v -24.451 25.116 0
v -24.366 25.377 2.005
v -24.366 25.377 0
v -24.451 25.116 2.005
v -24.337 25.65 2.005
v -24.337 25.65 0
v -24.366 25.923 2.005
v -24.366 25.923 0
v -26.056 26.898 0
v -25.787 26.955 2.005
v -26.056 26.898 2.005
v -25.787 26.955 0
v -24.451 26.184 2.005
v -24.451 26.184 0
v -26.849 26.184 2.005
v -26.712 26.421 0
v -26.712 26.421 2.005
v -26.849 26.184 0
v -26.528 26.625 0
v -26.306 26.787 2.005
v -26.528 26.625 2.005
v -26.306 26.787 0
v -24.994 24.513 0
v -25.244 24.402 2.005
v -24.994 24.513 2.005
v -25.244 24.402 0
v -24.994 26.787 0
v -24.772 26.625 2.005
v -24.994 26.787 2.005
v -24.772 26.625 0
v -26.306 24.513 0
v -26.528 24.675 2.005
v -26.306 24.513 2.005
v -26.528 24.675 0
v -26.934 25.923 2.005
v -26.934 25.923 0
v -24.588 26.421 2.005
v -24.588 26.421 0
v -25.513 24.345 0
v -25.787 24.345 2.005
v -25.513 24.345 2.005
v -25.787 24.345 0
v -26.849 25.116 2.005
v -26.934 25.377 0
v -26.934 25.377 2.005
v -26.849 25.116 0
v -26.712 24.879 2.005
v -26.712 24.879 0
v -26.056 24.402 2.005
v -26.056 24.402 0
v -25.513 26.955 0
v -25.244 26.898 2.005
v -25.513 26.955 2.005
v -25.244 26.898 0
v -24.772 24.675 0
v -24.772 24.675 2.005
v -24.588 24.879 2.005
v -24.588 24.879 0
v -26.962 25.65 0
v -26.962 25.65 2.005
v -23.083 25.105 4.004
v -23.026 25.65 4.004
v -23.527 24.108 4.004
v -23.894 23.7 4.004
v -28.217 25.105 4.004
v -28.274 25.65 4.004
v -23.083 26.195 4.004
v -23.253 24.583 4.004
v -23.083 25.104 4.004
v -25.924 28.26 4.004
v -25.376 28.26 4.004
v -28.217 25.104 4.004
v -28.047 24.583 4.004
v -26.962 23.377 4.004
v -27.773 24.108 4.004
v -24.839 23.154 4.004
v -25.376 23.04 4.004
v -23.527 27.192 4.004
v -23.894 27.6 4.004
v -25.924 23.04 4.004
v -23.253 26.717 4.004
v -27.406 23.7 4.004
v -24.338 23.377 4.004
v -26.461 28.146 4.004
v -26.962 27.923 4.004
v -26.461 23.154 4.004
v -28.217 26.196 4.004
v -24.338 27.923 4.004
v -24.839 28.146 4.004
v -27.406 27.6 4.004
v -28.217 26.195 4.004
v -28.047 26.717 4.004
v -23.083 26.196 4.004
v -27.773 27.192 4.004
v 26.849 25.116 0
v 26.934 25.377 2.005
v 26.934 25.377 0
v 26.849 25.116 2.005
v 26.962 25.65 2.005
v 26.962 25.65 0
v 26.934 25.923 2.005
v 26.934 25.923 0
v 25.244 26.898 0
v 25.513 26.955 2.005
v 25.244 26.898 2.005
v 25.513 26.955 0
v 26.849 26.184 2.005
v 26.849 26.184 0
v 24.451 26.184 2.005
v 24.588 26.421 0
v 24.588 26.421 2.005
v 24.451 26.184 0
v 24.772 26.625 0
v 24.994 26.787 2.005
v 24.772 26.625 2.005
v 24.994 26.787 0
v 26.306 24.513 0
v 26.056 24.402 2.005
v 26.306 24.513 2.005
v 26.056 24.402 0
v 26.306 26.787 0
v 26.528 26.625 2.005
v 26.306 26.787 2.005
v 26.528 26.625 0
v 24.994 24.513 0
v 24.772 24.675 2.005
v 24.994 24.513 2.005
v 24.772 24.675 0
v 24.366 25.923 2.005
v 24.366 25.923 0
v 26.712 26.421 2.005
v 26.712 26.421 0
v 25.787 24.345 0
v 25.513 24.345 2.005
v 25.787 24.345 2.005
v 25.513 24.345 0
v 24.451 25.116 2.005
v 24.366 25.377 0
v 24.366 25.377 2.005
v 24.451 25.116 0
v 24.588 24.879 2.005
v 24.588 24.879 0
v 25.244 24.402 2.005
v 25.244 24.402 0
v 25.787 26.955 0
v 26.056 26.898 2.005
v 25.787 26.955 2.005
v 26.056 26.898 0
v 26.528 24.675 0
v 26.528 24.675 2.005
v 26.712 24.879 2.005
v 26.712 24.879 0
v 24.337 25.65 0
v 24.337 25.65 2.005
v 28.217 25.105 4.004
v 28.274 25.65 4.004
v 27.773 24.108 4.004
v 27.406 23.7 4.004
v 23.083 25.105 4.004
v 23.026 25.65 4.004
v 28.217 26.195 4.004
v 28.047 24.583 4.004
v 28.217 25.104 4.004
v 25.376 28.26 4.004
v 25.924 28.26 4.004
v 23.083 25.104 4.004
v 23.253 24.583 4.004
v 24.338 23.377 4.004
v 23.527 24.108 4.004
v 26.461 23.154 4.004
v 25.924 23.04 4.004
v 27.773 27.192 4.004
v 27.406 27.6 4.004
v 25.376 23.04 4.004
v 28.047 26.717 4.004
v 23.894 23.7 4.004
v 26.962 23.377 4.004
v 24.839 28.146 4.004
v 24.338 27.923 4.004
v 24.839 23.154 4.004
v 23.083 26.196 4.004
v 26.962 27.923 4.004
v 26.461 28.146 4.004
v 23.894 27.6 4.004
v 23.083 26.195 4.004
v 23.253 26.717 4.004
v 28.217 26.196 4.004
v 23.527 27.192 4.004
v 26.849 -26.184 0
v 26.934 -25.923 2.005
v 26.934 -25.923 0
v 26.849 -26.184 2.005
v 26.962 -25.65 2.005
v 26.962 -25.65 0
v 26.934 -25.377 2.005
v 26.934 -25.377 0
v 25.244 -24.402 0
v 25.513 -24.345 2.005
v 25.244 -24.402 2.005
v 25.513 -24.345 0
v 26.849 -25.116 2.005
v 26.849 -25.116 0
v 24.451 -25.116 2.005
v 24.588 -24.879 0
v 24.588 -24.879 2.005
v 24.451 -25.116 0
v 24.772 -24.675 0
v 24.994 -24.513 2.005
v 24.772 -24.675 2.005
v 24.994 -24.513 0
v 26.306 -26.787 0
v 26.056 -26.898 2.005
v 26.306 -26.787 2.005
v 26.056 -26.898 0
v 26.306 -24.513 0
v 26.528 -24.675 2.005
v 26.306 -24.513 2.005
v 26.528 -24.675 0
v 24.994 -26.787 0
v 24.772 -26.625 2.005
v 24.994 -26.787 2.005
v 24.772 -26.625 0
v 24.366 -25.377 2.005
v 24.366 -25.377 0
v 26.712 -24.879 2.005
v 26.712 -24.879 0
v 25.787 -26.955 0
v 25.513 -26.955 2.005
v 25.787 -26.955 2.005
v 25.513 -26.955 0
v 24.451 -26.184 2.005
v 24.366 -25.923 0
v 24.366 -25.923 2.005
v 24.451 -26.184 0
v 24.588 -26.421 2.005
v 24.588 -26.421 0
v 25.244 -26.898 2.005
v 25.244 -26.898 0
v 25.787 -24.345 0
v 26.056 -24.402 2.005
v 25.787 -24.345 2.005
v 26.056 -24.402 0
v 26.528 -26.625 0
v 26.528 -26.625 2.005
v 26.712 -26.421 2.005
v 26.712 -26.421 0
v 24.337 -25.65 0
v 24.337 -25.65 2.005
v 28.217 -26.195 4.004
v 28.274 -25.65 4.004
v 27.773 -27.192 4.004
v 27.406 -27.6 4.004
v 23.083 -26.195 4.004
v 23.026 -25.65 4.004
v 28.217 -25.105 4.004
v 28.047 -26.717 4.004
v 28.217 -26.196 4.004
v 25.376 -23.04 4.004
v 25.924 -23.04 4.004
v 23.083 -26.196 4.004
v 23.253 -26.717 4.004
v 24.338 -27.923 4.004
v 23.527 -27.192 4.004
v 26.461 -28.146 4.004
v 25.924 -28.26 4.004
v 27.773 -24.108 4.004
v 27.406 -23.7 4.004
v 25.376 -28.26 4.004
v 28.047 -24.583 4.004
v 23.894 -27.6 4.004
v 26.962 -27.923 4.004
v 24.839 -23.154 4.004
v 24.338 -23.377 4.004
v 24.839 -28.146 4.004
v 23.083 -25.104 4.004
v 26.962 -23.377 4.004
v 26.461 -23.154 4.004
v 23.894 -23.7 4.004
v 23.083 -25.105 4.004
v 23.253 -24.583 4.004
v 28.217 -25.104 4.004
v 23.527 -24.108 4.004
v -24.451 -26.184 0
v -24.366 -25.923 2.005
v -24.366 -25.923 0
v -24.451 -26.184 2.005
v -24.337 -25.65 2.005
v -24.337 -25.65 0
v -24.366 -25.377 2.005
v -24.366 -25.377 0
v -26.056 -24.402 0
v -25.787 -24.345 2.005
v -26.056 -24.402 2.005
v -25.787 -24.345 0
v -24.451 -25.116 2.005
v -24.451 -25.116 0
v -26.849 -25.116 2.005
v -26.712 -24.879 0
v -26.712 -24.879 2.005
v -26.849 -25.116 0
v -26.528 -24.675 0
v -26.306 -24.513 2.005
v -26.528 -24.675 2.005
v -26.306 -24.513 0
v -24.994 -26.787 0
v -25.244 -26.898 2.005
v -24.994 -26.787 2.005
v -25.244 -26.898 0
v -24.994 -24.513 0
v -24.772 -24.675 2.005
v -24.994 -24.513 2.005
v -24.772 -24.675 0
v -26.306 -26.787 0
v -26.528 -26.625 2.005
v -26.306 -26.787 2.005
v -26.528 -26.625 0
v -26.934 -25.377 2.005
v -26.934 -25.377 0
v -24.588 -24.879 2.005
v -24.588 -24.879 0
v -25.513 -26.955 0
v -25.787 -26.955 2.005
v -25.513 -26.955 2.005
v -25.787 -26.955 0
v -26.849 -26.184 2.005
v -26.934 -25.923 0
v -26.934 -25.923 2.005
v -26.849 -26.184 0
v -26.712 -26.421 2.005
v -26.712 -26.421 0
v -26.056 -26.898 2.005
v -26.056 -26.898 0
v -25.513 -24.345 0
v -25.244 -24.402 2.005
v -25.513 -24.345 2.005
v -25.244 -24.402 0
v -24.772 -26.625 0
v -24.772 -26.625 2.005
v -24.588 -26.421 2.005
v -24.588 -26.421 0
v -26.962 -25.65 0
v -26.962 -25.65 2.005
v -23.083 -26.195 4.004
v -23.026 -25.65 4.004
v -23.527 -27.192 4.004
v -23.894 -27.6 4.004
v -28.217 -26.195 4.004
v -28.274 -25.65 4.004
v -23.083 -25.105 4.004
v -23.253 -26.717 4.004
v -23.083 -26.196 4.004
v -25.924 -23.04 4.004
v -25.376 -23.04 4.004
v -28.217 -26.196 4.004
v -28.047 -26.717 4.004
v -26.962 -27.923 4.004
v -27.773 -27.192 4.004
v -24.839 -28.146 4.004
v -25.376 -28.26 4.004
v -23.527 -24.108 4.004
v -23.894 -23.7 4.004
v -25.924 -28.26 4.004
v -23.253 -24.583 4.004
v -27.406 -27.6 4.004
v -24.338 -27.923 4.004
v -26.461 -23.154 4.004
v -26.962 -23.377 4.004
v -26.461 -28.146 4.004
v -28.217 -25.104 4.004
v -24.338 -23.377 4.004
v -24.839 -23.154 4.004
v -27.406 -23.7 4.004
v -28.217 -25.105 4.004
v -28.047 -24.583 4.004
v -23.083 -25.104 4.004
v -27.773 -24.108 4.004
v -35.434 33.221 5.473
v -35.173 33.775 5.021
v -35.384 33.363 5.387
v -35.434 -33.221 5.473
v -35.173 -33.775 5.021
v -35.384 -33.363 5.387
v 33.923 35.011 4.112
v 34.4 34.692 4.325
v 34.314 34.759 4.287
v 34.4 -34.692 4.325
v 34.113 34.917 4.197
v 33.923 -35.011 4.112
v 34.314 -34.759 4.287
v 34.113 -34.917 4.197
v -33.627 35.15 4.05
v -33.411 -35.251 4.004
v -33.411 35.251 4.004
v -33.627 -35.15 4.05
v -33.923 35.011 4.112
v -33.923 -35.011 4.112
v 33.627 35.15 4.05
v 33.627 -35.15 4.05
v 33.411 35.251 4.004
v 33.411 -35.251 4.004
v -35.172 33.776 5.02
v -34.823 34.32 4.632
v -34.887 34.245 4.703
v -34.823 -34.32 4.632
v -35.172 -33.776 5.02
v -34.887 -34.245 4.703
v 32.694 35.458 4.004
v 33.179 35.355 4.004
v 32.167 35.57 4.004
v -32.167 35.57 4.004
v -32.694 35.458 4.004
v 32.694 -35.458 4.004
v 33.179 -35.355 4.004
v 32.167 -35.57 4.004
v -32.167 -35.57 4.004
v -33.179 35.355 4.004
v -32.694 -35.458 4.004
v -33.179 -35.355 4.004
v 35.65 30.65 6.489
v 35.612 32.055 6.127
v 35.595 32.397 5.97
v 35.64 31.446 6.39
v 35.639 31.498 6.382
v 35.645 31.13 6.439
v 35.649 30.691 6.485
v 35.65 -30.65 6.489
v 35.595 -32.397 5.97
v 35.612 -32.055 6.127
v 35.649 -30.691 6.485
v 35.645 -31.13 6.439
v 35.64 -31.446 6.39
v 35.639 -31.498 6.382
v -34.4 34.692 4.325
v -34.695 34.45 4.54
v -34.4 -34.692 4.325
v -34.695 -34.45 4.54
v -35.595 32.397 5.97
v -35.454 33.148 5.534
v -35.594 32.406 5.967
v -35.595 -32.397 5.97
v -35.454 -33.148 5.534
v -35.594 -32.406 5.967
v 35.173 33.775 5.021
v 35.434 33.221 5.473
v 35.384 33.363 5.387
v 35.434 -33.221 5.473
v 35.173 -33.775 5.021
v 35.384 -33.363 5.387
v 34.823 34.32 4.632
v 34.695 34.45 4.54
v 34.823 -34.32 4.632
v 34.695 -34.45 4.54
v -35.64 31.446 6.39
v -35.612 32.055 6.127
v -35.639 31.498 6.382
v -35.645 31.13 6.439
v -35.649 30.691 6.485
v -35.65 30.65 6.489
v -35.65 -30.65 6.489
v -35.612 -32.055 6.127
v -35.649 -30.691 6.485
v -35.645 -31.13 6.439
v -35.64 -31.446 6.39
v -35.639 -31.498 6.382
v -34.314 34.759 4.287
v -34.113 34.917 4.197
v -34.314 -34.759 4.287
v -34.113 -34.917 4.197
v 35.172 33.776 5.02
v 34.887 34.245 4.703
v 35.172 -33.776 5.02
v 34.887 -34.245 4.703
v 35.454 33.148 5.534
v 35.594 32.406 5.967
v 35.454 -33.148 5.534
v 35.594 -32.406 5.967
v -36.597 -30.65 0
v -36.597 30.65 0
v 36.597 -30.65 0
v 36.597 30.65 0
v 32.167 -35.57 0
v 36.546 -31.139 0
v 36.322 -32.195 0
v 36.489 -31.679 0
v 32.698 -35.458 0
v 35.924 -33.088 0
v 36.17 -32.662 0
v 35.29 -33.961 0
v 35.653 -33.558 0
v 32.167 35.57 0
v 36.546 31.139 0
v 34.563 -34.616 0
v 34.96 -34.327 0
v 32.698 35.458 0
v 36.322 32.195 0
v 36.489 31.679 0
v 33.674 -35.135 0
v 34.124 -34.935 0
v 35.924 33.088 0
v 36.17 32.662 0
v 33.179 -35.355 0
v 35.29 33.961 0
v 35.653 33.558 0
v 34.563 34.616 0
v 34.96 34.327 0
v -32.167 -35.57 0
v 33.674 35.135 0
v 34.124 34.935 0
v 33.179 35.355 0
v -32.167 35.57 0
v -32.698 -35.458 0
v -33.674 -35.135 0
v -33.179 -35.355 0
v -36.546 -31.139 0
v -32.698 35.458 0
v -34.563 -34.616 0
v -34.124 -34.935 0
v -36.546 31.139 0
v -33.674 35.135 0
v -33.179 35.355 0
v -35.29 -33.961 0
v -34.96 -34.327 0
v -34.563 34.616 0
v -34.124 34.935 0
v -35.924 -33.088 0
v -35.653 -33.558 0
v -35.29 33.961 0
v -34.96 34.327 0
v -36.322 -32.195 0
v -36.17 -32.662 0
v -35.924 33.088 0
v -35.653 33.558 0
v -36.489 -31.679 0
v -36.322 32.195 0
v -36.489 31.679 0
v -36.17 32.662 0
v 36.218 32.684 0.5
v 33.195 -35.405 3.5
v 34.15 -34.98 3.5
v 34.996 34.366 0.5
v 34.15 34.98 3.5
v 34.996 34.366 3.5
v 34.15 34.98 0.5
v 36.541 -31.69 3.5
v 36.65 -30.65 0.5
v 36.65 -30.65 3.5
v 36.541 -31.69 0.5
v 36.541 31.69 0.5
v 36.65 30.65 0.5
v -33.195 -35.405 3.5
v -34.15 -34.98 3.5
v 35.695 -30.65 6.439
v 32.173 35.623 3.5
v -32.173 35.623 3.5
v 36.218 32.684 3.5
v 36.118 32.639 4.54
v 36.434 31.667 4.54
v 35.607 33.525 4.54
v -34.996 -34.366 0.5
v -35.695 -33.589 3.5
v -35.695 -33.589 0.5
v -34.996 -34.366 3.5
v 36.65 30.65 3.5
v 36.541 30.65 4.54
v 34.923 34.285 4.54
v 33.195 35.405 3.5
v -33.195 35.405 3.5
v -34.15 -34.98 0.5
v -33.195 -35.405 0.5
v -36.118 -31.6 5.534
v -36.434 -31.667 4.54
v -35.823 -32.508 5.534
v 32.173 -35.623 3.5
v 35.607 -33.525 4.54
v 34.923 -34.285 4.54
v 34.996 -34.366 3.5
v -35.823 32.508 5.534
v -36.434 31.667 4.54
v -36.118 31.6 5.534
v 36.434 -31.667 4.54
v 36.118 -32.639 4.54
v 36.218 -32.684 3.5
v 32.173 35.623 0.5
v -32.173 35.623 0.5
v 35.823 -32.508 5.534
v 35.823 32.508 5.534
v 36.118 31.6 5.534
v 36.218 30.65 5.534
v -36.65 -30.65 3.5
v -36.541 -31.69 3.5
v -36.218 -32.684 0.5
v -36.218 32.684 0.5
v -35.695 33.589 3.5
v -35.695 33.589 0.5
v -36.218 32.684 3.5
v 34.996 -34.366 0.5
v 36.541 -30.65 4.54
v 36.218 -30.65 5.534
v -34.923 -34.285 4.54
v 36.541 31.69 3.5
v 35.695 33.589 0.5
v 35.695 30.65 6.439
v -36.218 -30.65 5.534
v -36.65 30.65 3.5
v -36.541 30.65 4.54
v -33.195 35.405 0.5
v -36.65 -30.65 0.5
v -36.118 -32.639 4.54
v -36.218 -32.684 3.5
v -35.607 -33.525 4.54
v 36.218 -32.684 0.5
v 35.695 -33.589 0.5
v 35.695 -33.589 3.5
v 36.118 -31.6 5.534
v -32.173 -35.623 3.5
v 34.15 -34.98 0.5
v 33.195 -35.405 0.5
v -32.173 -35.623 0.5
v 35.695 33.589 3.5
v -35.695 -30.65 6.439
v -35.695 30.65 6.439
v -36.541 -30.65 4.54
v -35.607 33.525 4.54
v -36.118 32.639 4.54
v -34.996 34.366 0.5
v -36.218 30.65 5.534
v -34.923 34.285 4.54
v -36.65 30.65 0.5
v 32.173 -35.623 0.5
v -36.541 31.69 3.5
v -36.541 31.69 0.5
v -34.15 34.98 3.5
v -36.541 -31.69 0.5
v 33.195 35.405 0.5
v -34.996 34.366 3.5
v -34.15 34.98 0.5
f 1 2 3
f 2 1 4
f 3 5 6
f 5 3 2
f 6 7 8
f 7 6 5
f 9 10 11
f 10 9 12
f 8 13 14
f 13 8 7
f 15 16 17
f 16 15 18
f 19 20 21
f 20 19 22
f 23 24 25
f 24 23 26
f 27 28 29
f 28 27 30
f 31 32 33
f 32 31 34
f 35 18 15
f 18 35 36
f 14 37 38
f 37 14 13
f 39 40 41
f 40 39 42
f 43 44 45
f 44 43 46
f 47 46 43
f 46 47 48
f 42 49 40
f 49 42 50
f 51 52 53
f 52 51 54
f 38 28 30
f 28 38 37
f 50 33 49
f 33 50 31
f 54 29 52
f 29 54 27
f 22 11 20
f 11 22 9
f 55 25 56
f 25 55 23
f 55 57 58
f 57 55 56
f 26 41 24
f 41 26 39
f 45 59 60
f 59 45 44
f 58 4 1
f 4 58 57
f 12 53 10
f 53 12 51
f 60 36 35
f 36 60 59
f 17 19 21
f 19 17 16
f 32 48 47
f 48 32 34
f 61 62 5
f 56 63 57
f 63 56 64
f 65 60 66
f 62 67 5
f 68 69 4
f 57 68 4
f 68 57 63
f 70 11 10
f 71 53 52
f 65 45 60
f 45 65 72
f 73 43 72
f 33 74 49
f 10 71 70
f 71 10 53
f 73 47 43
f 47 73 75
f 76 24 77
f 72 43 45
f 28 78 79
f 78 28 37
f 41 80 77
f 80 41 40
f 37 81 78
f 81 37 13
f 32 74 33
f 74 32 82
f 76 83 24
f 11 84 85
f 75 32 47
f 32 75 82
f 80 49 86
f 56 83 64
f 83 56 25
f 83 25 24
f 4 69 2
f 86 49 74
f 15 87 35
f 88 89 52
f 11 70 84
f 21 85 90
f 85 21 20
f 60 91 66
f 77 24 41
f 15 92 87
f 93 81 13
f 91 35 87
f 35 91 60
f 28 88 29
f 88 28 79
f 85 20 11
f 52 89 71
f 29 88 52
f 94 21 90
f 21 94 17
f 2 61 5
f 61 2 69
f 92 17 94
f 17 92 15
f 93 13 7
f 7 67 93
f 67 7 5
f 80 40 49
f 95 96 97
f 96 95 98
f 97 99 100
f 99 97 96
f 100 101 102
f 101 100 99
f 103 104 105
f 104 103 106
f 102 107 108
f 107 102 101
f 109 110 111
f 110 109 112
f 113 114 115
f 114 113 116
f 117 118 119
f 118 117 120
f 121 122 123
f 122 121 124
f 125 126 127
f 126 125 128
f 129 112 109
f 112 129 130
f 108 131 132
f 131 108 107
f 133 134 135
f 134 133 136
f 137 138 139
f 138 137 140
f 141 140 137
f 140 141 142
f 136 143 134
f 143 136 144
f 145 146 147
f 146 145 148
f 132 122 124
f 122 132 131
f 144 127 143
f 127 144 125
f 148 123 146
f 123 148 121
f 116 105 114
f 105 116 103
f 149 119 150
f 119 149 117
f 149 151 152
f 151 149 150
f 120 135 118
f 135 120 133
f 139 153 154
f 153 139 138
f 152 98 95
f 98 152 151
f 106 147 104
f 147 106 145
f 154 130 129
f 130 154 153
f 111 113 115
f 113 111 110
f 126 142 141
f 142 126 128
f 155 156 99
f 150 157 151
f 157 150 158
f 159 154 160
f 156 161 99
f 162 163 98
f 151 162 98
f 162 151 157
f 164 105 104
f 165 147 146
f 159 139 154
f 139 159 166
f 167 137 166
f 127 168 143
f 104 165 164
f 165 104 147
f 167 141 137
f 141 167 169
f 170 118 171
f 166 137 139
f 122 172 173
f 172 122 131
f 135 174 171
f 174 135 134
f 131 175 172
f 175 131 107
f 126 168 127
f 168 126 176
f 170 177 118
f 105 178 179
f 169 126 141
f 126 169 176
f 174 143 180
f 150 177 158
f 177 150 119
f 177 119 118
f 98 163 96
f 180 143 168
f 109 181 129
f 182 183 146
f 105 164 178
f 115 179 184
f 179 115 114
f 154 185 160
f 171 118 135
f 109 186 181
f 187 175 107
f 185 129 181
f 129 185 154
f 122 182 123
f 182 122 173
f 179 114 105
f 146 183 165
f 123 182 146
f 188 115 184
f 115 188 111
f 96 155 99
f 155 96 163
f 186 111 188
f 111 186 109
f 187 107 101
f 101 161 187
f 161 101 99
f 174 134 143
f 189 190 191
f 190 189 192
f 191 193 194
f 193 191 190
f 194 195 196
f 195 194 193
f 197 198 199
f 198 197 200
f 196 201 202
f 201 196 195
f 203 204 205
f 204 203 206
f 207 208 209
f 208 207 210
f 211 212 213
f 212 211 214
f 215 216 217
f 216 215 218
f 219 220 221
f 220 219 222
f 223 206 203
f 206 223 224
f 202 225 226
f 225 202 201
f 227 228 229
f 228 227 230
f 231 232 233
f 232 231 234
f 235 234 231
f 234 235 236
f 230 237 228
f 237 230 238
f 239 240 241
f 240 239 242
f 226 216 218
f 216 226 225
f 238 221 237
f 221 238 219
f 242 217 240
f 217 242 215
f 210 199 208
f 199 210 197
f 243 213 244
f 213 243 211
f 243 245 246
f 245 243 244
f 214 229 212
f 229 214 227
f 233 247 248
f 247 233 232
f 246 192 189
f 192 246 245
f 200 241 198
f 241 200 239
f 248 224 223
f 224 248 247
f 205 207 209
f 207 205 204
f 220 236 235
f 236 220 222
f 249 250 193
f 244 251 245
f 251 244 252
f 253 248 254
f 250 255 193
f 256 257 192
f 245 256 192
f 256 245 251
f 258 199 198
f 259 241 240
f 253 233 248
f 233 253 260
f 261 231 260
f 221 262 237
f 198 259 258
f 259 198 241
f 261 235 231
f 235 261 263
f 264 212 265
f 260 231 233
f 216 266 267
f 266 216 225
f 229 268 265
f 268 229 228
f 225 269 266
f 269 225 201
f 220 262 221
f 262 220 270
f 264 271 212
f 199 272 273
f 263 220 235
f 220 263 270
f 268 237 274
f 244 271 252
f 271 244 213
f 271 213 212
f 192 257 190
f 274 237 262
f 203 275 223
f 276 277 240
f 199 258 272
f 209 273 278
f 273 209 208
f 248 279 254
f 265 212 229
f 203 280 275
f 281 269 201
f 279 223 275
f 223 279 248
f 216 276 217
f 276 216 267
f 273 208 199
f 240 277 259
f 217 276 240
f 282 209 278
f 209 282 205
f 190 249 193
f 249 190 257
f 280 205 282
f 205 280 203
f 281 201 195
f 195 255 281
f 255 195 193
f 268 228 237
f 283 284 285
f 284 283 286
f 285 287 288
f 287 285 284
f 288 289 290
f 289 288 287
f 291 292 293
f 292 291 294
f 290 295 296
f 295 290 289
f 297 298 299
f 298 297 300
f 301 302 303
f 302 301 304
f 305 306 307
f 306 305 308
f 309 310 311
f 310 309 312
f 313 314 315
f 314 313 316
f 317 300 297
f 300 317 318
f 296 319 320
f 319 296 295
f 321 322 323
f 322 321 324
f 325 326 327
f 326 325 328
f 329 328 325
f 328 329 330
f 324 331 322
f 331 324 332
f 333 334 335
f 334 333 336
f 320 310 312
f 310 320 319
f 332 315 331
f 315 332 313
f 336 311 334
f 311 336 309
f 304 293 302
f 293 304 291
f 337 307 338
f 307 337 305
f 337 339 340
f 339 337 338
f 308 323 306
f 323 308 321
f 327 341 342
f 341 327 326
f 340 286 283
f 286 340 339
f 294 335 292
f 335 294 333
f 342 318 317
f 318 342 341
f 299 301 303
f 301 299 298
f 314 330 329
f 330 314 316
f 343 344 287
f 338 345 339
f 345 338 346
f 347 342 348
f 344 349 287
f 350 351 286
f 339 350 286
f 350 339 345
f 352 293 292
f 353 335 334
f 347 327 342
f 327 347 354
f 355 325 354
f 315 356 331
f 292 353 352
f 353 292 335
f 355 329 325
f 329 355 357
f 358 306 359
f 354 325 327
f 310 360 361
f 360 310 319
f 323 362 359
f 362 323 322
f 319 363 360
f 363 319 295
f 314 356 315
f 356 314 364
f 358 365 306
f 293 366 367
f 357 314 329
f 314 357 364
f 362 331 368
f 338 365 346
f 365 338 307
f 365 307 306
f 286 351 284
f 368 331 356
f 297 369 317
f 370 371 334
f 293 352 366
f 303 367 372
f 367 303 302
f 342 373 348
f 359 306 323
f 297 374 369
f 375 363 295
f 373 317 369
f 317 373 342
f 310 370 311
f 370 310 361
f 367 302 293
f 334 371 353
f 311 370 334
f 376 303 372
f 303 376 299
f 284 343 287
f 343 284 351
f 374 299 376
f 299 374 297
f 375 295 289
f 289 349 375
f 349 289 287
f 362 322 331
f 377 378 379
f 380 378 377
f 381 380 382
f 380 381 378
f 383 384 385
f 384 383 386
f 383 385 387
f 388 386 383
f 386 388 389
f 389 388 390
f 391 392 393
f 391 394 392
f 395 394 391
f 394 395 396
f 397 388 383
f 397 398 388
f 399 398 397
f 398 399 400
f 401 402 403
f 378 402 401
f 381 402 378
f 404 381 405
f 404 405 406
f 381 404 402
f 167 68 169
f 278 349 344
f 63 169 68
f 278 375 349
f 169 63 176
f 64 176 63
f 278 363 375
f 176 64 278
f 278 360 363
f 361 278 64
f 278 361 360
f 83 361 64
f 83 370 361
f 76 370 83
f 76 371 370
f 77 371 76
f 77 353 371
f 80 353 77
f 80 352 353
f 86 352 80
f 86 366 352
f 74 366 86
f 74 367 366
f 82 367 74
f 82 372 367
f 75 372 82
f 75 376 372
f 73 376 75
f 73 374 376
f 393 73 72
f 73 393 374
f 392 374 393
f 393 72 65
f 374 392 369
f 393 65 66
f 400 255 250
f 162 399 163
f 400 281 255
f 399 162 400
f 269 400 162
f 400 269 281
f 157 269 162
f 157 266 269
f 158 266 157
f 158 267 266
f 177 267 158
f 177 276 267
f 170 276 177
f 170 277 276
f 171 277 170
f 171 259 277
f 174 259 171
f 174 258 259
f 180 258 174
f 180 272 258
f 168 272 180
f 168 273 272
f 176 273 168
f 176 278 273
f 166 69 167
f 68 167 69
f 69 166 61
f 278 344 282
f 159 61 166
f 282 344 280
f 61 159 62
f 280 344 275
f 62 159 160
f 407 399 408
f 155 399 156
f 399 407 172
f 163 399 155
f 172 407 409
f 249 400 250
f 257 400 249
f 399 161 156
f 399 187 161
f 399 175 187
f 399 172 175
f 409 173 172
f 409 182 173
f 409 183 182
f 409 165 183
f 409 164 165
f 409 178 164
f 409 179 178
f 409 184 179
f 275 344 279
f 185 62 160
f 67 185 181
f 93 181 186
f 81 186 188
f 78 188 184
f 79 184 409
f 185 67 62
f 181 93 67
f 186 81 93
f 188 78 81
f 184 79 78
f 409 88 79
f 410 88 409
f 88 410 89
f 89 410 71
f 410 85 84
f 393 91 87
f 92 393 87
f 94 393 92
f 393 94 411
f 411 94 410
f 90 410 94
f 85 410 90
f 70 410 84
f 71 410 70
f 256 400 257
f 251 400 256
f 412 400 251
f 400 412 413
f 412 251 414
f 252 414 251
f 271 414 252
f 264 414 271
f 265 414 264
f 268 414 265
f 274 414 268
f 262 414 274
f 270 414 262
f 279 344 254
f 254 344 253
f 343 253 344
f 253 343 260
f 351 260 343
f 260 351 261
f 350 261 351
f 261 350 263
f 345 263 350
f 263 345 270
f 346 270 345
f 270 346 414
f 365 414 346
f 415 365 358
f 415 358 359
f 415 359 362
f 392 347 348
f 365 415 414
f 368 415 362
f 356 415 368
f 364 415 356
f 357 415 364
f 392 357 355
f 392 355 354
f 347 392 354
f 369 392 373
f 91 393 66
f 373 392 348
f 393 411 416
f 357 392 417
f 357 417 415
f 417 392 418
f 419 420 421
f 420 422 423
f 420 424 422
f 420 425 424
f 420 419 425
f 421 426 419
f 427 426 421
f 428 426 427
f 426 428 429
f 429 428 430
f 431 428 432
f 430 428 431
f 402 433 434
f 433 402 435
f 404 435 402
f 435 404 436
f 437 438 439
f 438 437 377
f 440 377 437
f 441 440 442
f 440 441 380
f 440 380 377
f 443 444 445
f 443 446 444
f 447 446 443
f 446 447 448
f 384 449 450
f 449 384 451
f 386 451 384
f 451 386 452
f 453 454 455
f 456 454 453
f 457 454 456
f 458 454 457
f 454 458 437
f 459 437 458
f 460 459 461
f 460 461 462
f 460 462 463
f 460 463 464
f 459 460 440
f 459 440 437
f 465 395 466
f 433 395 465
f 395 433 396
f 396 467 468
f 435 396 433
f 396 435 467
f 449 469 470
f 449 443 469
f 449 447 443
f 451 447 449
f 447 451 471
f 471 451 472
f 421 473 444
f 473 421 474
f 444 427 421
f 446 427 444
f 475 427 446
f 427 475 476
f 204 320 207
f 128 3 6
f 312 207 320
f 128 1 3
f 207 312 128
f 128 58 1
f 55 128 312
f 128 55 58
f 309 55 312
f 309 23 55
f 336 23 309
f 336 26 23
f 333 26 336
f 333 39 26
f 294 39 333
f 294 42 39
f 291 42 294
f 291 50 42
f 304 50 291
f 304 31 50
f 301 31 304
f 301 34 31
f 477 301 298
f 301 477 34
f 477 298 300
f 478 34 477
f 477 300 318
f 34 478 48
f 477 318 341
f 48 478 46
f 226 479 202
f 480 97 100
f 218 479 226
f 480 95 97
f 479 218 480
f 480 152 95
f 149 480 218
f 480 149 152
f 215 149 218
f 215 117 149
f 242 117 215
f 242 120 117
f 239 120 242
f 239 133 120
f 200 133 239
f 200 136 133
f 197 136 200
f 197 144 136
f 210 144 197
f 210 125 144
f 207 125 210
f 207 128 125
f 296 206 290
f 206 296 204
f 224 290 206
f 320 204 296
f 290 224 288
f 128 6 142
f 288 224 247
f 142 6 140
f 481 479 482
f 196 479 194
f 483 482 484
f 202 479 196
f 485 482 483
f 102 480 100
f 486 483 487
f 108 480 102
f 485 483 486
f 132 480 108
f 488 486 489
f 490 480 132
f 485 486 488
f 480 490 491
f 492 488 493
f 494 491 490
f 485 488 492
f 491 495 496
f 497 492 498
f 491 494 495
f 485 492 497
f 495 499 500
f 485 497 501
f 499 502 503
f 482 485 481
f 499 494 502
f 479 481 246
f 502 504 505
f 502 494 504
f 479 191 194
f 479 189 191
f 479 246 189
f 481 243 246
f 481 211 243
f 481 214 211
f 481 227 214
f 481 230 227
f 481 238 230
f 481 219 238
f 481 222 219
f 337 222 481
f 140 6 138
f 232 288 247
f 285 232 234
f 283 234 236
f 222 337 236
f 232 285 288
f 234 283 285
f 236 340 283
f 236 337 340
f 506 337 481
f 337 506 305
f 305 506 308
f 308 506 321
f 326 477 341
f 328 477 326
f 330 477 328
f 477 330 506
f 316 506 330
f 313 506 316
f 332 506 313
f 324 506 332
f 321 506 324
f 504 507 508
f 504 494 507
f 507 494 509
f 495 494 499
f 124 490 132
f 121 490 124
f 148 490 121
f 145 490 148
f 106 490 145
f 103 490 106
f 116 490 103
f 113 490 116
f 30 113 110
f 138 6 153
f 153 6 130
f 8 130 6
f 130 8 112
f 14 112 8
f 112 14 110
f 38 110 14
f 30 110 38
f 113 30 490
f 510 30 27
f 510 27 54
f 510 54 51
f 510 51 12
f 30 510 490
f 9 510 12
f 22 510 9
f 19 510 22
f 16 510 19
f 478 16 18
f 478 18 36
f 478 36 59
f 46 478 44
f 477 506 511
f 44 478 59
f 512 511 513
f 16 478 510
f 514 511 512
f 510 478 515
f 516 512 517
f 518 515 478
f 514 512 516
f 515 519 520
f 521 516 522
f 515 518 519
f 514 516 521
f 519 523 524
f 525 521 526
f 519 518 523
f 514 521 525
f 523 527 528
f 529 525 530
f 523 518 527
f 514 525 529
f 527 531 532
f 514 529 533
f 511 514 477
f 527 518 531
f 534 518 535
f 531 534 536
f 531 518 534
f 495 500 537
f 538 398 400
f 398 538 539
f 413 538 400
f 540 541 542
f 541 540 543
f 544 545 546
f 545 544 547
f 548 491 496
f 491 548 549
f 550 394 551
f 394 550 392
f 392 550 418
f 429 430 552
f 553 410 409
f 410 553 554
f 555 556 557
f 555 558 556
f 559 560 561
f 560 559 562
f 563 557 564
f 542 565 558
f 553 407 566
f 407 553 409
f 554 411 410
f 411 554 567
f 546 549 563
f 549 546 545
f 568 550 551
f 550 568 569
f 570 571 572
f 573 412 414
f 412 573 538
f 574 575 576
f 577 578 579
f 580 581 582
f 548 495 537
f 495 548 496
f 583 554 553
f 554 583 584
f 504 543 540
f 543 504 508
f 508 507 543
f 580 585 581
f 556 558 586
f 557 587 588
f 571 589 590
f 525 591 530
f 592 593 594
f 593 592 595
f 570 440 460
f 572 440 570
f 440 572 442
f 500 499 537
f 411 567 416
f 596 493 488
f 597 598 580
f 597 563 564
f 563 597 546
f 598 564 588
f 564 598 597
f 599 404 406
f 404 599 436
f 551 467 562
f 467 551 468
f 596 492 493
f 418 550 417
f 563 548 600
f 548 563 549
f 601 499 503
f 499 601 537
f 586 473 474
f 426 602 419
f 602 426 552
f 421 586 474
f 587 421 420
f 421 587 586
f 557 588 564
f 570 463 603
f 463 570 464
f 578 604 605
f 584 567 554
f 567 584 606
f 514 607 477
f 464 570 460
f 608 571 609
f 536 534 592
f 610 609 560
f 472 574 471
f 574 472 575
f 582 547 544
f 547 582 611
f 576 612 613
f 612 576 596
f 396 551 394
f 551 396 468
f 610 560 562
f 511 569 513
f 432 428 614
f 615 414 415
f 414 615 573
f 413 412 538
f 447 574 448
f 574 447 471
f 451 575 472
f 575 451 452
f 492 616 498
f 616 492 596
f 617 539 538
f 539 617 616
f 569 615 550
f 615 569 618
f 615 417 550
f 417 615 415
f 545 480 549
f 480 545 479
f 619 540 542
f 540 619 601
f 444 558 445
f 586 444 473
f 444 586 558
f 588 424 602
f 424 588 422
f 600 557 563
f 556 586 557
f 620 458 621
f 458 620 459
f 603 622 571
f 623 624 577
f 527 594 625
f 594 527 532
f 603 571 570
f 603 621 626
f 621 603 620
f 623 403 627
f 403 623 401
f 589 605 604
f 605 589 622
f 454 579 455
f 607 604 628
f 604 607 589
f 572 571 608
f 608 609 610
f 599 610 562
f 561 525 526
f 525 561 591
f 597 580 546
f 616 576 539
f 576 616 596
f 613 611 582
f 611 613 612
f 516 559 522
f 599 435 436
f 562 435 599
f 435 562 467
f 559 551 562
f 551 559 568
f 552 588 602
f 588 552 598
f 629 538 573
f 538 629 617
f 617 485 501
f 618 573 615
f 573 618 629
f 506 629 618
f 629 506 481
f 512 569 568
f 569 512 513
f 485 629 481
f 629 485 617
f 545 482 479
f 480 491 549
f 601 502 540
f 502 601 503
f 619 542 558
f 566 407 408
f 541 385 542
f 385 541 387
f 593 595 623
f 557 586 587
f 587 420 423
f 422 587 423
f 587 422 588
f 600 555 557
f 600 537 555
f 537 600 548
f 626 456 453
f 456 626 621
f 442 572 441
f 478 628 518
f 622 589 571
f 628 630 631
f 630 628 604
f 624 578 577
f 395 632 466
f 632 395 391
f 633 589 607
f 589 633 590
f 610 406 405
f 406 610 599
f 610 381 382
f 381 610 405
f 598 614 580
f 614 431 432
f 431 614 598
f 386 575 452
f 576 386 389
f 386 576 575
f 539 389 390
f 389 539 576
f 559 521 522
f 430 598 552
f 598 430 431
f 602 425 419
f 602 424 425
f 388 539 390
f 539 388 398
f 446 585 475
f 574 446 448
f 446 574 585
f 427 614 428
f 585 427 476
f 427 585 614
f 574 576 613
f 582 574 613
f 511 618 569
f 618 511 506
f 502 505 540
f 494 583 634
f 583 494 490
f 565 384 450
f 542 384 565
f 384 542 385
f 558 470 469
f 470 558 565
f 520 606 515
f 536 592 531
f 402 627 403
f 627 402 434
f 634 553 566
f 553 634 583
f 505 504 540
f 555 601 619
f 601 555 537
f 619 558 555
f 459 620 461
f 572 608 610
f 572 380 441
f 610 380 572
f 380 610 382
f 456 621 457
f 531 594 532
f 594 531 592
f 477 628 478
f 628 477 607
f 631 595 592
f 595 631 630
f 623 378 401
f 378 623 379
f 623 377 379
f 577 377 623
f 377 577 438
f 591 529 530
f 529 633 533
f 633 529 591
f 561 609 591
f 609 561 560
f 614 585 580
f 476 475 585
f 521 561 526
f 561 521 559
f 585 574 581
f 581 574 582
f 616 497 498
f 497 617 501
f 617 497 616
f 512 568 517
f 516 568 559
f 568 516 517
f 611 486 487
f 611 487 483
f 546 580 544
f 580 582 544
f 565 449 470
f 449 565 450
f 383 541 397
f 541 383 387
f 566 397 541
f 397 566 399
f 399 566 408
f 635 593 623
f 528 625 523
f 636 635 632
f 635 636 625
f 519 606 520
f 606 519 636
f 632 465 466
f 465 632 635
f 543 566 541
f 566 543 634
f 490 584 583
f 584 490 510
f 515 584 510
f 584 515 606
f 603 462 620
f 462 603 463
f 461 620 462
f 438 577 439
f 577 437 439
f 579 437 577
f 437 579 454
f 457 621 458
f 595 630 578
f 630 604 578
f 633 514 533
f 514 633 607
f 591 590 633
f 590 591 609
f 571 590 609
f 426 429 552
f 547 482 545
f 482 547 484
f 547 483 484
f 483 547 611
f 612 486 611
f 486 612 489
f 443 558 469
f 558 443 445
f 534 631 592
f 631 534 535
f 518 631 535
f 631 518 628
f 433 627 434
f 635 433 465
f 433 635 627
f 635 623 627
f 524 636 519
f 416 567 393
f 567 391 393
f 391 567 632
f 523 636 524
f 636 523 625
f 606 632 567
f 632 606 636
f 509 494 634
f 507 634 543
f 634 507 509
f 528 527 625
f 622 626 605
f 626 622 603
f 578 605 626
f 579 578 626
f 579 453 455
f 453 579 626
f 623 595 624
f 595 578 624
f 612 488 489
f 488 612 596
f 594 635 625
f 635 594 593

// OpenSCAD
// ©2019 Michael Kellner
// http://www.robotranch.org
//
// holder for a wireless phone charger (https://amzn.to/2I4xsDQ)
// thing: 3546610
$fn = 30;

// 3 actions. Pick one.
doTest = 1;                 // for trying things out
doLid = 2;                  // flat or with a cutout for S6 (see below)
doBase = 3;                 // base that holds the electronics

ACTION = doLid;

// for the lid, set this to 1 if you want the guide for the S6
optionS6Cutout = 1;

fudge = 0.3;
breakSkin = .005;

holeScale = 1.05;

coilR = 50 / 2 + 1;
coilH = 2+ 2 + fudge;

pcbW = 33 + fudge;
pcbH = 30 + fudge;
pcbD = 1 + 4;

s6W = 71 + fudge;
s6H = 143 + fudge;
s6D = 7.5;


module coil() {
    cylinder(r = coilR, h = coilH);
}

module pcb() {
    translate([0, 0, 0])
    rotate([0, 0, 90])
        #cube([pcbW, pcbH, pcbD]);
}

wiregapW = 15;
wiregapH = 30;
wiregapD = coilH + pcbD;
wiregapX = -2 + coilR -wiregapW / 2;
wiregapY = -wiregapH / 2;
wiregapZ = 0;

usbW = 30;
usbH = 10 + 5;
usbD = 7 + 4;
usbX = -40;
usbY = -usbH/2;
usbZ = -2.5;

module wiregap() {
    translate([wiregapX, wiregapY, wiregapZ])
        cube([wiregapW, wiregapH, wiregapD]);
}

module usbgap() {
   translate([usbX, usbY, usbZ])
        cube([usbW, usbH, usbD]);
}


screwHeadH = 2;
screwHeadD = 5;

module screw(size=2.5, length=10) {
    cylinder(r=(size/2)*holeScale, h=length);
    cylinder(r1=(screwHeadD/2)*holeScale, r2=(size/2)*holeScale, h=screwHeadH);
}

minkR = 5;
baseW = s6W - 2*minkR;
baseH = baseW;
baseD = 10 ;
baseX = -baseW/2;
baseY = -baseH/2;
baseZ = 1;

lidW = baseW + (2 * optionS6Cutout);
lidH = baseH;
lidD = 3;
lidX = baseX + (-1 * optionS6Cutout);
lidY = baseY;
lidZ = -lidD - .5;

screwOffset = baseW/2 - 5;
screwZ = -4 - breakSkin;

module lidScrews() {
#           translate([-screwOffset, -screwOffset, screwZ])
                screw();
            translate([ screwOffset, -screwOffset, screwZ])
                screw();
            translate([ screwOffset,  screwOffset, screwZ])
                screw();
            translate([-screwOffset,  screwOffset, screwZ])
                screw();
}

module positive() {
    translate([baseX, baseY, baseZ-.5])
        minkowski() {
            cube([baseW, baseH, baseD]);
            cylinder(r=minkR, h=1, center=true);
        }
}

module negative() {
    coil();
    translate([pcbW/2, -pcbH/2-2, coilH])
        pcb();
    wiregap();
    usbgap();
    lidScrews();
}

module base() {
    difference() {
        positive();
   #    negative();
    }
}

module s6() {
    translate([-s6W/2+2.5, -s6H/2, 0])
        minkowski() {
            cube([s6W-5, s6H-5, s6D-3]);
            sphere(r=2.5);
        }
}

module lid() {
    difference() {
        union() {
            translate([lidX, lidY, lidZ])
                minkowski() {
                    cube([lidW, lidH, lidD]);
                    if (optionS6Cutout)
                            sphere(r=minkR, h=1, center=true);
                    else
                        cylinder(r=minkR, h=1, center=true);
                }
        }
        union() {
            lidScrews();
            if (optionS6Cutout) {
                translate([0, 0, -11+breakSkin*2])
                    s6();
            }
            translate([-10-lidW/2, -10-lidH/2, 0])
                cube([lidW+20, lidH+20, lidD+20]);
        }
    }
}

rotate([180, 0, 0])
if (ACTION == doTest) {
    lid();
     difference() {
        base();
        lidScrews();
    }
 *   negative();
}
else if (ACTION == doBase)
    #base();
else if (ACTION == doLid)
        lid();



* #s6();
